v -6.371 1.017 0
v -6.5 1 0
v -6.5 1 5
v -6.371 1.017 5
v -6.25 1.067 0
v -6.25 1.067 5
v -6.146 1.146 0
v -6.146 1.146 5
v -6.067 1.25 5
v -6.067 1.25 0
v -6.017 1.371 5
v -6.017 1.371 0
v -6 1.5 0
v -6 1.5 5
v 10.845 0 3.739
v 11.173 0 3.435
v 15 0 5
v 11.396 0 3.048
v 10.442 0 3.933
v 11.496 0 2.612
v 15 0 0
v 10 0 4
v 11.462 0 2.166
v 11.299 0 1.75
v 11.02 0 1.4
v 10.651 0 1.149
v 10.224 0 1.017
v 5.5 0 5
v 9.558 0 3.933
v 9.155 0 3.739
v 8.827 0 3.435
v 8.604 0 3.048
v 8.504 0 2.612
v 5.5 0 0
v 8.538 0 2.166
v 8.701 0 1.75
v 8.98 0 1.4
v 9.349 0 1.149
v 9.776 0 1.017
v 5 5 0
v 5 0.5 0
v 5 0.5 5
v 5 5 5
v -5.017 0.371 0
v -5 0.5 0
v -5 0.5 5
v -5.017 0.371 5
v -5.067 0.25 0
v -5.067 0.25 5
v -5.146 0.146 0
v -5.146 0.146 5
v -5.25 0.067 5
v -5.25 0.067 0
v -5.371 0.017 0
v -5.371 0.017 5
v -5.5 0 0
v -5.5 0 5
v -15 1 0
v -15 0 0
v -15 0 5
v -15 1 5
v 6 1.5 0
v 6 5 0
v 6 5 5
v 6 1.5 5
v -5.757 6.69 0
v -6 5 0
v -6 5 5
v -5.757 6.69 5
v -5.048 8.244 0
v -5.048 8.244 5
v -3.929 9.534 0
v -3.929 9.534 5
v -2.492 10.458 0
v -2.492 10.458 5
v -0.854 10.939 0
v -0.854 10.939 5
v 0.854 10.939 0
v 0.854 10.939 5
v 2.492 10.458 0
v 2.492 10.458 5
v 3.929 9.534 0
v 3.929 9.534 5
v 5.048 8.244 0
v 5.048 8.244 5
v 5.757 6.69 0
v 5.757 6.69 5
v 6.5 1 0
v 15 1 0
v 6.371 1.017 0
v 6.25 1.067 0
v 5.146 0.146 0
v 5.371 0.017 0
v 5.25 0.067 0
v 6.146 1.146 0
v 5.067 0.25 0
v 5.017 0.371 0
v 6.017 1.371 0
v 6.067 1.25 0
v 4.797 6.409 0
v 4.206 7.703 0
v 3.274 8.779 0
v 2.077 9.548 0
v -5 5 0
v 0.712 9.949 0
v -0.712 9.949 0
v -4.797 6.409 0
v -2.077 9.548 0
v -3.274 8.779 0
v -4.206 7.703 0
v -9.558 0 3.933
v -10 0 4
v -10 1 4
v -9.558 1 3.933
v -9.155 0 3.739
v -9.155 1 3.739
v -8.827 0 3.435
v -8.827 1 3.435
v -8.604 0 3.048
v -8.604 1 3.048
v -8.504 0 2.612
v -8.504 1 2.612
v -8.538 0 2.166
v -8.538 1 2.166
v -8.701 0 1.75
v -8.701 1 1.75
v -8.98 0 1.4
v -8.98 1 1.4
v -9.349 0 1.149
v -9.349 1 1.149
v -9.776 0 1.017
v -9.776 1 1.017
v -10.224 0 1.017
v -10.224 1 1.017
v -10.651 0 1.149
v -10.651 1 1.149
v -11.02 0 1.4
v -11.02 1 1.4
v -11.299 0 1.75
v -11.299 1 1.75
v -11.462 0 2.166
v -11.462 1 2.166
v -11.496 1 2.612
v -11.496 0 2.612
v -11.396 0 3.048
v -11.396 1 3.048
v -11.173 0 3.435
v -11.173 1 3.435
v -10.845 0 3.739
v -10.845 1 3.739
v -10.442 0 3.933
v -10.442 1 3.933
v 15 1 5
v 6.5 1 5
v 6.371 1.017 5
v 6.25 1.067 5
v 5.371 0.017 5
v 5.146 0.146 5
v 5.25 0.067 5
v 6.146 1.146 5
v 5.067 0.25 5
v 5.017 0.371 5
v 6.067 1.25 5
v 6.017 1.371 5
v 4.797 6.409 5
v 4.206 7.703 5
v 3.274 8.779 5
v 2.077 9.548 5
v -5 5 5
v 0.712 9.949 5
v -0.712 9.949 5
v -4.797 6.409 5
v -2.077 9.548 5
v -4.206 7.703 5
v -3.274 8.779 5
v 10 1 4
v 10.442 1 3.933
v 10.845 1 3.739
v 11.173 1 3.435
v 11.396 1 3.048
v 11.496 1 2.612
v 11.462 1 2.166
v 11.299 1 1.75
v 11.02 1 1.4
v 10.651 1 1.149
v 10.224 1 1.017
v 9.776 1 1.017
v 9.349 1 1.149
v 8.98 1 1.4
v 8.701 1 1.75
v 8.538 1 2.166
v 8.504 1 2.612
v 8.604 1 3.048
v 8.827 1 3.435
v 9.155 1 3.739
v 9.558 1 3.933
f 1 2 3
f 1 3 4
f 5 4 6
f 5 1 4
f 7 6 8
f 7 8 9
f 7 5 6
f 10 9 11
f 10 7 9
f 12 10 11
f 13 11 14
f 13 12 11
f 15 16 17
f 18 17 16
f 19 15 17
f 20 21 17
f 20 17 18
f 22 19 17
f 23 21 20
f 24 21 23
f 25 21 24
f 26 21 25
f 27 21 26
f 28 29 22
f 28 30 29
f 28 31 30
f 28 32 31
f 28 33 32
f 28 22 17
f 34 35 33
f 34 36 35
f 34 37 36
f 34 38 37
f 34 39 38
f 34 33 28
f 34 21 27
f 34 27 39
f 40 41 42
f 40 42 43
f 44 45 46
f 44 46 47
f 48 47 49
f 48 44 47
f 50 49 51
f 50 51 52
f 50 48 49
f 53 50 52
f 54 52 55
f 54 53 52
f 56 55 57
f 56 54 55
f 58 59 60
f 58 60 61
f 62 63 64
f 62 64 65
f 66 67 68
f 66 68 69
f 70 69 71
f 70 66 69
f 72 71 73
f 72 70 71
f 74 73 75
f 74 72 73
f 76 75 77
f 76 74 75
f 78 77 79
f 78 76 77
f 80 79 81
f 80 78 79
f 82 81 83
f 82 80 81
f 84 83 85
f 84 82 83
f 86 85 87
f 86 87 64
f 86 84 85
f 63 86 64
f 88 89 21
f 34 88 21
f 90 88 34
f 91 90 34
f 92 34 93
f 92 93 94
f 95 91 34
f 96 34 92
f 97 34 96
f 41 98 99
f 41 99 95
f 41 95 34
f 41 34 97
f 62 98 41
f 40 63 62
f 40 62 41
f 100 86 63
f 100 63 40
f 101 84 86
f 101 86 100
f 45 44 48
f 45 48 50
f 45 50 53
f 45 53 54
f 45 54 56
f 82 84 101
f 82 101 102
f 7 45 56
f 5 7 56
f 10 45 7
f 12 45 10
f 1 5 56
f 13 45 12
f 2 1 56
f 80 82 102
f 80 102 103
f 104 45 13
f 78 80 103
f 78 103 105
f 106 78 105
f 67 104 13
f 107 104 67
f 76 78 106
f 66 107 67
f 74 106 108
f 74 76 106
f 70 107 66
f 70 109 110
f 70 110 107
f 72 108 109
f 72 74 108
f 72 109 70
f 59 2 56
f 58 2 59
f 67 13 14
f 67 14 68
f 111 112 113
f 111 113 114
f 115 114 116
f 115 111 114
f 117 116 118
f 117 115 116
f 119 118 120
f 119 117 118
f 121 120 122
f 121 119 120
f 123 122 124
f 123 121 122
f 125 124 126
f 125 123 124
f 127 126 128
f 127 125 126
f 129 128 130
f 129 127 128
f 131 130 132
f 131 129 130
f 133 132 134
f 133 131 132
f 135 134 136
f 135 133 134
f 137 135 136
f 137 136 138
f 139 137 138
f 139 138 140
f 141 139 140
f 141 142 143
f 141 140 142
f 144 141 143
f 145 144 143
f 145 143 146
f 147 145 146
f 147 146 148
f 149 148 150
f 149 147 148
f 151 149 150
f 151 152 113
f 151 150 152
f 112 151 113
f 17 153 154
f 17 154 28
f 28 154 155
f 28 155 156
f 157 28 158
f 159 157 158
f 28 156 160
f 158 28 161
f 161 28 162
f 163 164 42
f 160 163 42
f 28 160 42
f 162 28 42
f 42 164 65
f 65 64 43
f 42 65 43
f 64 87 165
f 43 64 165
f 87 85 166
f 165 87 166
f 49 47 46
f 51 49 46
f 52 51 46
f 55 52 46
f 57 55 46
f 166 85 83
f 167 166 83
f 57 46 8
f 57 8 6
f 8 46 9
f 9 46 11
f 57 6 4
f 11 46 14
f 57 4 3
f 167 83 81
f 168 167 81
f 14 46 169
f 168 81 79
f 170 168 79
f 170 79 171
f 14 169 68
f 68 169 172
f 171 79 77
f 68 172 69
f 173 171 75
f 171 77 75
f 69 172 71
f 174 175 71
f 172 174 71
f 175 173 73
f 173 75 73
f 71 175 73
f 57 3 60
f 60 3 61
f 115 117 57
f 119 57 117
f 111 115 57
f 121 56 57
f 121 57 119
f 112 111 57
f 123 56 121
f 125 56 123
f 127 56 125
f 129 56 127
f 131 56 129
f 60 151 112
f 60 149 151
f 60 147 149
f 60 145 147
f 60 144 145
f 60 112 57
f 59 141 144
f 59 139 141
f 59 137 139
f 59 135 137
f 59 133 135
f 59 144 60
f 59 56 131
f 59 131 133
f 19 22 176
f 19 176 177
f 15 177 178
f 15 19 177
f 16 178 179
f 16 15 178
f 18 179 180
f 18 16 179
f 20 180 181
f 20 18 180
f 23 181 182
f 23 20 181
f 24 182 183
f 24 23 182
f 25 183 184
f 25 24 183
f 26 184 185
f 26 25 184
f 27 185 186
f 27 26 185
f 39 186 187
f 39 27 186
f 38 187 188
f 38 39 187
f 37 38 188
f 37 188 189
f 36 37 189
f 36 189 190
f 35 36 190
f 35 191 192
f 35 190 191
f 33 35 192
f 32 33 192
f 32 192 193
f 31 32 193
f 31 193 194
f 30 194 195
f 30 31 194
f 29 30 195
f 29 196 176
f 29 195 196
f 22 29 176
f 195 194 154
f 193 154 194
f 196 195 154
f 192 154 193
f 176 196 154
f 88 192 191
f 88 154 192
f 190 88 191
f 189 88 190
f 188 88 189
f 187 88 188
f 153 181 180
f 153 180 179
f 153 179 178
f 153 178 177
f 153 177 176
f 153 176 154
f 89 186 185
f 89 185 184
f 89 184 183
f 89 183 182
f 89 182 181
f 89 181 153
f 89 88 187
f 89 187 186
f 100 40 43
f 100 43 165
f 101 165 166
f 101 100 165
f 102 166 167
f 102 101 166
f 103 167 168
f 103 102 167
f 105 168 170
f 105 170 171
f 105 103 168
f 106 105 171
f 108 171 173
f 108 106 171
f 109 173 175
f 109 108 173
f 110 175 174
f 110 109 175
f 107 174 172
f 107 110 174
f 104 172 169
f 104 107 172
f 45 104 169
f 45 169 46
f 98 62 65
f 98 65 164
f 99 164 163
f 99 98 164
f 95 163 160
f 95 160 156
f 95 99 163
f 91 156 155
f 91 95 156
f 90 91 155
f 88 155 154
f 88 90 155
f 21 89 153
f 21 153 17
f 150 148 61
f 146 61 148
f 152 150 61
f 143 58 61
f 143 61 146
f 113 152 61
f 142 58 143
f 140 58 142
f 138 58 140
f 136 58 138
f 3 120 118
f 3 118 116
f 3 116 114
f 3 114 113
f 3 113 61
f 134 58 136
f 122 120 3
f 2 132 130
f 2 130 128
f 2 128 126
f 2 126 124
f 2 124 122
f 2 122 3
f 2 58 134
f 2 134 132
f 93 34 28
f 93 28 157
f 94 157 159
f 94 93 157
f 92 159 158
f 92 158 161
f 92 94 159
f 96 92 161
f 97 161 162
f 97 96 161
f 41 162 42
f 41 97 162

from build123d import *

# Parameters (mm, degrees)
EXTRUDE_1_DEPTH          = 5
CUT_EXTRUDE_1_DEPTH      = 19.708286934
CUT_EXTRUDE_1_DEPTH_BACK = 19.708286934
SKETCH_2_R               = 1.5


with BuildPart() as part:
    # 草图1 → 凸台-拉伸1 (new body)
    with BuildSketch(Plane.XY):
        with BuildLine():
            Line((-5, 5), (-5, 0.5))
            ThreePointArc((-5, 0.5), (-5.146446609, 0.146446609), (-5.5, 0))
            Line((-5.5, 0), (-15, 0))
            Line((-15, 0), (-15, 1))
            Line((-15, 1), (-6.5, 1))
            ThreePointArc((-6.5, 1), (-6.146446609, 1.146446609), (-6, 1.5))
            Line((-6, 1.5), (-6, 5))
            ThreePointArc((-6, 5), (0, 11), (6, 5))
            Line((6, 5), (6, 1.5))
            ThreePointArc((6, 1.5), (6.146446609, 1.146446609), (6.5, 1))
            Line((6.5, 1), (15, 1))
            Line((15, 1), (15, 0))
            Line((15, 0), (5.5, 0))
            ThreePointArc((5.5, 0), (5.146446609, 0.146446609), (5, 0.5))
            Line((5, 0.5), (5, 5))
            ThreePointArc((5, 5), (0, 10), (-5, 5))
        make_face()
    extrude(amount=EXTRUDE_1_DEPTH)

    # 草图2 → 切除-拉伸1 (cut, two sides: drawn at the far end of the back side and taken through both)
    with BuildSketch(Plane(origin=(0, 1, 0), x_dir=(1, 0, 0), z_dir=(0, 1, 0)).offset(-CUT_EXTRUDE_1_DEPTH_BACK)):
        with Locations(Location((-10, -2.5, 0), (0, 0, 270))):
            Circle(SKETCH_2_R)
        with Locations(Location((10, -2.5, 0), (0, 0, 270))):
            Circle(SKETCH_2_R)
    extrude(amount=CUT_EXTRUDE_1_DEPTH + CUT_EXTRUDE_1_DEPTH_BACK, mode=Mode.SUBTRACT)


solid = part.part
